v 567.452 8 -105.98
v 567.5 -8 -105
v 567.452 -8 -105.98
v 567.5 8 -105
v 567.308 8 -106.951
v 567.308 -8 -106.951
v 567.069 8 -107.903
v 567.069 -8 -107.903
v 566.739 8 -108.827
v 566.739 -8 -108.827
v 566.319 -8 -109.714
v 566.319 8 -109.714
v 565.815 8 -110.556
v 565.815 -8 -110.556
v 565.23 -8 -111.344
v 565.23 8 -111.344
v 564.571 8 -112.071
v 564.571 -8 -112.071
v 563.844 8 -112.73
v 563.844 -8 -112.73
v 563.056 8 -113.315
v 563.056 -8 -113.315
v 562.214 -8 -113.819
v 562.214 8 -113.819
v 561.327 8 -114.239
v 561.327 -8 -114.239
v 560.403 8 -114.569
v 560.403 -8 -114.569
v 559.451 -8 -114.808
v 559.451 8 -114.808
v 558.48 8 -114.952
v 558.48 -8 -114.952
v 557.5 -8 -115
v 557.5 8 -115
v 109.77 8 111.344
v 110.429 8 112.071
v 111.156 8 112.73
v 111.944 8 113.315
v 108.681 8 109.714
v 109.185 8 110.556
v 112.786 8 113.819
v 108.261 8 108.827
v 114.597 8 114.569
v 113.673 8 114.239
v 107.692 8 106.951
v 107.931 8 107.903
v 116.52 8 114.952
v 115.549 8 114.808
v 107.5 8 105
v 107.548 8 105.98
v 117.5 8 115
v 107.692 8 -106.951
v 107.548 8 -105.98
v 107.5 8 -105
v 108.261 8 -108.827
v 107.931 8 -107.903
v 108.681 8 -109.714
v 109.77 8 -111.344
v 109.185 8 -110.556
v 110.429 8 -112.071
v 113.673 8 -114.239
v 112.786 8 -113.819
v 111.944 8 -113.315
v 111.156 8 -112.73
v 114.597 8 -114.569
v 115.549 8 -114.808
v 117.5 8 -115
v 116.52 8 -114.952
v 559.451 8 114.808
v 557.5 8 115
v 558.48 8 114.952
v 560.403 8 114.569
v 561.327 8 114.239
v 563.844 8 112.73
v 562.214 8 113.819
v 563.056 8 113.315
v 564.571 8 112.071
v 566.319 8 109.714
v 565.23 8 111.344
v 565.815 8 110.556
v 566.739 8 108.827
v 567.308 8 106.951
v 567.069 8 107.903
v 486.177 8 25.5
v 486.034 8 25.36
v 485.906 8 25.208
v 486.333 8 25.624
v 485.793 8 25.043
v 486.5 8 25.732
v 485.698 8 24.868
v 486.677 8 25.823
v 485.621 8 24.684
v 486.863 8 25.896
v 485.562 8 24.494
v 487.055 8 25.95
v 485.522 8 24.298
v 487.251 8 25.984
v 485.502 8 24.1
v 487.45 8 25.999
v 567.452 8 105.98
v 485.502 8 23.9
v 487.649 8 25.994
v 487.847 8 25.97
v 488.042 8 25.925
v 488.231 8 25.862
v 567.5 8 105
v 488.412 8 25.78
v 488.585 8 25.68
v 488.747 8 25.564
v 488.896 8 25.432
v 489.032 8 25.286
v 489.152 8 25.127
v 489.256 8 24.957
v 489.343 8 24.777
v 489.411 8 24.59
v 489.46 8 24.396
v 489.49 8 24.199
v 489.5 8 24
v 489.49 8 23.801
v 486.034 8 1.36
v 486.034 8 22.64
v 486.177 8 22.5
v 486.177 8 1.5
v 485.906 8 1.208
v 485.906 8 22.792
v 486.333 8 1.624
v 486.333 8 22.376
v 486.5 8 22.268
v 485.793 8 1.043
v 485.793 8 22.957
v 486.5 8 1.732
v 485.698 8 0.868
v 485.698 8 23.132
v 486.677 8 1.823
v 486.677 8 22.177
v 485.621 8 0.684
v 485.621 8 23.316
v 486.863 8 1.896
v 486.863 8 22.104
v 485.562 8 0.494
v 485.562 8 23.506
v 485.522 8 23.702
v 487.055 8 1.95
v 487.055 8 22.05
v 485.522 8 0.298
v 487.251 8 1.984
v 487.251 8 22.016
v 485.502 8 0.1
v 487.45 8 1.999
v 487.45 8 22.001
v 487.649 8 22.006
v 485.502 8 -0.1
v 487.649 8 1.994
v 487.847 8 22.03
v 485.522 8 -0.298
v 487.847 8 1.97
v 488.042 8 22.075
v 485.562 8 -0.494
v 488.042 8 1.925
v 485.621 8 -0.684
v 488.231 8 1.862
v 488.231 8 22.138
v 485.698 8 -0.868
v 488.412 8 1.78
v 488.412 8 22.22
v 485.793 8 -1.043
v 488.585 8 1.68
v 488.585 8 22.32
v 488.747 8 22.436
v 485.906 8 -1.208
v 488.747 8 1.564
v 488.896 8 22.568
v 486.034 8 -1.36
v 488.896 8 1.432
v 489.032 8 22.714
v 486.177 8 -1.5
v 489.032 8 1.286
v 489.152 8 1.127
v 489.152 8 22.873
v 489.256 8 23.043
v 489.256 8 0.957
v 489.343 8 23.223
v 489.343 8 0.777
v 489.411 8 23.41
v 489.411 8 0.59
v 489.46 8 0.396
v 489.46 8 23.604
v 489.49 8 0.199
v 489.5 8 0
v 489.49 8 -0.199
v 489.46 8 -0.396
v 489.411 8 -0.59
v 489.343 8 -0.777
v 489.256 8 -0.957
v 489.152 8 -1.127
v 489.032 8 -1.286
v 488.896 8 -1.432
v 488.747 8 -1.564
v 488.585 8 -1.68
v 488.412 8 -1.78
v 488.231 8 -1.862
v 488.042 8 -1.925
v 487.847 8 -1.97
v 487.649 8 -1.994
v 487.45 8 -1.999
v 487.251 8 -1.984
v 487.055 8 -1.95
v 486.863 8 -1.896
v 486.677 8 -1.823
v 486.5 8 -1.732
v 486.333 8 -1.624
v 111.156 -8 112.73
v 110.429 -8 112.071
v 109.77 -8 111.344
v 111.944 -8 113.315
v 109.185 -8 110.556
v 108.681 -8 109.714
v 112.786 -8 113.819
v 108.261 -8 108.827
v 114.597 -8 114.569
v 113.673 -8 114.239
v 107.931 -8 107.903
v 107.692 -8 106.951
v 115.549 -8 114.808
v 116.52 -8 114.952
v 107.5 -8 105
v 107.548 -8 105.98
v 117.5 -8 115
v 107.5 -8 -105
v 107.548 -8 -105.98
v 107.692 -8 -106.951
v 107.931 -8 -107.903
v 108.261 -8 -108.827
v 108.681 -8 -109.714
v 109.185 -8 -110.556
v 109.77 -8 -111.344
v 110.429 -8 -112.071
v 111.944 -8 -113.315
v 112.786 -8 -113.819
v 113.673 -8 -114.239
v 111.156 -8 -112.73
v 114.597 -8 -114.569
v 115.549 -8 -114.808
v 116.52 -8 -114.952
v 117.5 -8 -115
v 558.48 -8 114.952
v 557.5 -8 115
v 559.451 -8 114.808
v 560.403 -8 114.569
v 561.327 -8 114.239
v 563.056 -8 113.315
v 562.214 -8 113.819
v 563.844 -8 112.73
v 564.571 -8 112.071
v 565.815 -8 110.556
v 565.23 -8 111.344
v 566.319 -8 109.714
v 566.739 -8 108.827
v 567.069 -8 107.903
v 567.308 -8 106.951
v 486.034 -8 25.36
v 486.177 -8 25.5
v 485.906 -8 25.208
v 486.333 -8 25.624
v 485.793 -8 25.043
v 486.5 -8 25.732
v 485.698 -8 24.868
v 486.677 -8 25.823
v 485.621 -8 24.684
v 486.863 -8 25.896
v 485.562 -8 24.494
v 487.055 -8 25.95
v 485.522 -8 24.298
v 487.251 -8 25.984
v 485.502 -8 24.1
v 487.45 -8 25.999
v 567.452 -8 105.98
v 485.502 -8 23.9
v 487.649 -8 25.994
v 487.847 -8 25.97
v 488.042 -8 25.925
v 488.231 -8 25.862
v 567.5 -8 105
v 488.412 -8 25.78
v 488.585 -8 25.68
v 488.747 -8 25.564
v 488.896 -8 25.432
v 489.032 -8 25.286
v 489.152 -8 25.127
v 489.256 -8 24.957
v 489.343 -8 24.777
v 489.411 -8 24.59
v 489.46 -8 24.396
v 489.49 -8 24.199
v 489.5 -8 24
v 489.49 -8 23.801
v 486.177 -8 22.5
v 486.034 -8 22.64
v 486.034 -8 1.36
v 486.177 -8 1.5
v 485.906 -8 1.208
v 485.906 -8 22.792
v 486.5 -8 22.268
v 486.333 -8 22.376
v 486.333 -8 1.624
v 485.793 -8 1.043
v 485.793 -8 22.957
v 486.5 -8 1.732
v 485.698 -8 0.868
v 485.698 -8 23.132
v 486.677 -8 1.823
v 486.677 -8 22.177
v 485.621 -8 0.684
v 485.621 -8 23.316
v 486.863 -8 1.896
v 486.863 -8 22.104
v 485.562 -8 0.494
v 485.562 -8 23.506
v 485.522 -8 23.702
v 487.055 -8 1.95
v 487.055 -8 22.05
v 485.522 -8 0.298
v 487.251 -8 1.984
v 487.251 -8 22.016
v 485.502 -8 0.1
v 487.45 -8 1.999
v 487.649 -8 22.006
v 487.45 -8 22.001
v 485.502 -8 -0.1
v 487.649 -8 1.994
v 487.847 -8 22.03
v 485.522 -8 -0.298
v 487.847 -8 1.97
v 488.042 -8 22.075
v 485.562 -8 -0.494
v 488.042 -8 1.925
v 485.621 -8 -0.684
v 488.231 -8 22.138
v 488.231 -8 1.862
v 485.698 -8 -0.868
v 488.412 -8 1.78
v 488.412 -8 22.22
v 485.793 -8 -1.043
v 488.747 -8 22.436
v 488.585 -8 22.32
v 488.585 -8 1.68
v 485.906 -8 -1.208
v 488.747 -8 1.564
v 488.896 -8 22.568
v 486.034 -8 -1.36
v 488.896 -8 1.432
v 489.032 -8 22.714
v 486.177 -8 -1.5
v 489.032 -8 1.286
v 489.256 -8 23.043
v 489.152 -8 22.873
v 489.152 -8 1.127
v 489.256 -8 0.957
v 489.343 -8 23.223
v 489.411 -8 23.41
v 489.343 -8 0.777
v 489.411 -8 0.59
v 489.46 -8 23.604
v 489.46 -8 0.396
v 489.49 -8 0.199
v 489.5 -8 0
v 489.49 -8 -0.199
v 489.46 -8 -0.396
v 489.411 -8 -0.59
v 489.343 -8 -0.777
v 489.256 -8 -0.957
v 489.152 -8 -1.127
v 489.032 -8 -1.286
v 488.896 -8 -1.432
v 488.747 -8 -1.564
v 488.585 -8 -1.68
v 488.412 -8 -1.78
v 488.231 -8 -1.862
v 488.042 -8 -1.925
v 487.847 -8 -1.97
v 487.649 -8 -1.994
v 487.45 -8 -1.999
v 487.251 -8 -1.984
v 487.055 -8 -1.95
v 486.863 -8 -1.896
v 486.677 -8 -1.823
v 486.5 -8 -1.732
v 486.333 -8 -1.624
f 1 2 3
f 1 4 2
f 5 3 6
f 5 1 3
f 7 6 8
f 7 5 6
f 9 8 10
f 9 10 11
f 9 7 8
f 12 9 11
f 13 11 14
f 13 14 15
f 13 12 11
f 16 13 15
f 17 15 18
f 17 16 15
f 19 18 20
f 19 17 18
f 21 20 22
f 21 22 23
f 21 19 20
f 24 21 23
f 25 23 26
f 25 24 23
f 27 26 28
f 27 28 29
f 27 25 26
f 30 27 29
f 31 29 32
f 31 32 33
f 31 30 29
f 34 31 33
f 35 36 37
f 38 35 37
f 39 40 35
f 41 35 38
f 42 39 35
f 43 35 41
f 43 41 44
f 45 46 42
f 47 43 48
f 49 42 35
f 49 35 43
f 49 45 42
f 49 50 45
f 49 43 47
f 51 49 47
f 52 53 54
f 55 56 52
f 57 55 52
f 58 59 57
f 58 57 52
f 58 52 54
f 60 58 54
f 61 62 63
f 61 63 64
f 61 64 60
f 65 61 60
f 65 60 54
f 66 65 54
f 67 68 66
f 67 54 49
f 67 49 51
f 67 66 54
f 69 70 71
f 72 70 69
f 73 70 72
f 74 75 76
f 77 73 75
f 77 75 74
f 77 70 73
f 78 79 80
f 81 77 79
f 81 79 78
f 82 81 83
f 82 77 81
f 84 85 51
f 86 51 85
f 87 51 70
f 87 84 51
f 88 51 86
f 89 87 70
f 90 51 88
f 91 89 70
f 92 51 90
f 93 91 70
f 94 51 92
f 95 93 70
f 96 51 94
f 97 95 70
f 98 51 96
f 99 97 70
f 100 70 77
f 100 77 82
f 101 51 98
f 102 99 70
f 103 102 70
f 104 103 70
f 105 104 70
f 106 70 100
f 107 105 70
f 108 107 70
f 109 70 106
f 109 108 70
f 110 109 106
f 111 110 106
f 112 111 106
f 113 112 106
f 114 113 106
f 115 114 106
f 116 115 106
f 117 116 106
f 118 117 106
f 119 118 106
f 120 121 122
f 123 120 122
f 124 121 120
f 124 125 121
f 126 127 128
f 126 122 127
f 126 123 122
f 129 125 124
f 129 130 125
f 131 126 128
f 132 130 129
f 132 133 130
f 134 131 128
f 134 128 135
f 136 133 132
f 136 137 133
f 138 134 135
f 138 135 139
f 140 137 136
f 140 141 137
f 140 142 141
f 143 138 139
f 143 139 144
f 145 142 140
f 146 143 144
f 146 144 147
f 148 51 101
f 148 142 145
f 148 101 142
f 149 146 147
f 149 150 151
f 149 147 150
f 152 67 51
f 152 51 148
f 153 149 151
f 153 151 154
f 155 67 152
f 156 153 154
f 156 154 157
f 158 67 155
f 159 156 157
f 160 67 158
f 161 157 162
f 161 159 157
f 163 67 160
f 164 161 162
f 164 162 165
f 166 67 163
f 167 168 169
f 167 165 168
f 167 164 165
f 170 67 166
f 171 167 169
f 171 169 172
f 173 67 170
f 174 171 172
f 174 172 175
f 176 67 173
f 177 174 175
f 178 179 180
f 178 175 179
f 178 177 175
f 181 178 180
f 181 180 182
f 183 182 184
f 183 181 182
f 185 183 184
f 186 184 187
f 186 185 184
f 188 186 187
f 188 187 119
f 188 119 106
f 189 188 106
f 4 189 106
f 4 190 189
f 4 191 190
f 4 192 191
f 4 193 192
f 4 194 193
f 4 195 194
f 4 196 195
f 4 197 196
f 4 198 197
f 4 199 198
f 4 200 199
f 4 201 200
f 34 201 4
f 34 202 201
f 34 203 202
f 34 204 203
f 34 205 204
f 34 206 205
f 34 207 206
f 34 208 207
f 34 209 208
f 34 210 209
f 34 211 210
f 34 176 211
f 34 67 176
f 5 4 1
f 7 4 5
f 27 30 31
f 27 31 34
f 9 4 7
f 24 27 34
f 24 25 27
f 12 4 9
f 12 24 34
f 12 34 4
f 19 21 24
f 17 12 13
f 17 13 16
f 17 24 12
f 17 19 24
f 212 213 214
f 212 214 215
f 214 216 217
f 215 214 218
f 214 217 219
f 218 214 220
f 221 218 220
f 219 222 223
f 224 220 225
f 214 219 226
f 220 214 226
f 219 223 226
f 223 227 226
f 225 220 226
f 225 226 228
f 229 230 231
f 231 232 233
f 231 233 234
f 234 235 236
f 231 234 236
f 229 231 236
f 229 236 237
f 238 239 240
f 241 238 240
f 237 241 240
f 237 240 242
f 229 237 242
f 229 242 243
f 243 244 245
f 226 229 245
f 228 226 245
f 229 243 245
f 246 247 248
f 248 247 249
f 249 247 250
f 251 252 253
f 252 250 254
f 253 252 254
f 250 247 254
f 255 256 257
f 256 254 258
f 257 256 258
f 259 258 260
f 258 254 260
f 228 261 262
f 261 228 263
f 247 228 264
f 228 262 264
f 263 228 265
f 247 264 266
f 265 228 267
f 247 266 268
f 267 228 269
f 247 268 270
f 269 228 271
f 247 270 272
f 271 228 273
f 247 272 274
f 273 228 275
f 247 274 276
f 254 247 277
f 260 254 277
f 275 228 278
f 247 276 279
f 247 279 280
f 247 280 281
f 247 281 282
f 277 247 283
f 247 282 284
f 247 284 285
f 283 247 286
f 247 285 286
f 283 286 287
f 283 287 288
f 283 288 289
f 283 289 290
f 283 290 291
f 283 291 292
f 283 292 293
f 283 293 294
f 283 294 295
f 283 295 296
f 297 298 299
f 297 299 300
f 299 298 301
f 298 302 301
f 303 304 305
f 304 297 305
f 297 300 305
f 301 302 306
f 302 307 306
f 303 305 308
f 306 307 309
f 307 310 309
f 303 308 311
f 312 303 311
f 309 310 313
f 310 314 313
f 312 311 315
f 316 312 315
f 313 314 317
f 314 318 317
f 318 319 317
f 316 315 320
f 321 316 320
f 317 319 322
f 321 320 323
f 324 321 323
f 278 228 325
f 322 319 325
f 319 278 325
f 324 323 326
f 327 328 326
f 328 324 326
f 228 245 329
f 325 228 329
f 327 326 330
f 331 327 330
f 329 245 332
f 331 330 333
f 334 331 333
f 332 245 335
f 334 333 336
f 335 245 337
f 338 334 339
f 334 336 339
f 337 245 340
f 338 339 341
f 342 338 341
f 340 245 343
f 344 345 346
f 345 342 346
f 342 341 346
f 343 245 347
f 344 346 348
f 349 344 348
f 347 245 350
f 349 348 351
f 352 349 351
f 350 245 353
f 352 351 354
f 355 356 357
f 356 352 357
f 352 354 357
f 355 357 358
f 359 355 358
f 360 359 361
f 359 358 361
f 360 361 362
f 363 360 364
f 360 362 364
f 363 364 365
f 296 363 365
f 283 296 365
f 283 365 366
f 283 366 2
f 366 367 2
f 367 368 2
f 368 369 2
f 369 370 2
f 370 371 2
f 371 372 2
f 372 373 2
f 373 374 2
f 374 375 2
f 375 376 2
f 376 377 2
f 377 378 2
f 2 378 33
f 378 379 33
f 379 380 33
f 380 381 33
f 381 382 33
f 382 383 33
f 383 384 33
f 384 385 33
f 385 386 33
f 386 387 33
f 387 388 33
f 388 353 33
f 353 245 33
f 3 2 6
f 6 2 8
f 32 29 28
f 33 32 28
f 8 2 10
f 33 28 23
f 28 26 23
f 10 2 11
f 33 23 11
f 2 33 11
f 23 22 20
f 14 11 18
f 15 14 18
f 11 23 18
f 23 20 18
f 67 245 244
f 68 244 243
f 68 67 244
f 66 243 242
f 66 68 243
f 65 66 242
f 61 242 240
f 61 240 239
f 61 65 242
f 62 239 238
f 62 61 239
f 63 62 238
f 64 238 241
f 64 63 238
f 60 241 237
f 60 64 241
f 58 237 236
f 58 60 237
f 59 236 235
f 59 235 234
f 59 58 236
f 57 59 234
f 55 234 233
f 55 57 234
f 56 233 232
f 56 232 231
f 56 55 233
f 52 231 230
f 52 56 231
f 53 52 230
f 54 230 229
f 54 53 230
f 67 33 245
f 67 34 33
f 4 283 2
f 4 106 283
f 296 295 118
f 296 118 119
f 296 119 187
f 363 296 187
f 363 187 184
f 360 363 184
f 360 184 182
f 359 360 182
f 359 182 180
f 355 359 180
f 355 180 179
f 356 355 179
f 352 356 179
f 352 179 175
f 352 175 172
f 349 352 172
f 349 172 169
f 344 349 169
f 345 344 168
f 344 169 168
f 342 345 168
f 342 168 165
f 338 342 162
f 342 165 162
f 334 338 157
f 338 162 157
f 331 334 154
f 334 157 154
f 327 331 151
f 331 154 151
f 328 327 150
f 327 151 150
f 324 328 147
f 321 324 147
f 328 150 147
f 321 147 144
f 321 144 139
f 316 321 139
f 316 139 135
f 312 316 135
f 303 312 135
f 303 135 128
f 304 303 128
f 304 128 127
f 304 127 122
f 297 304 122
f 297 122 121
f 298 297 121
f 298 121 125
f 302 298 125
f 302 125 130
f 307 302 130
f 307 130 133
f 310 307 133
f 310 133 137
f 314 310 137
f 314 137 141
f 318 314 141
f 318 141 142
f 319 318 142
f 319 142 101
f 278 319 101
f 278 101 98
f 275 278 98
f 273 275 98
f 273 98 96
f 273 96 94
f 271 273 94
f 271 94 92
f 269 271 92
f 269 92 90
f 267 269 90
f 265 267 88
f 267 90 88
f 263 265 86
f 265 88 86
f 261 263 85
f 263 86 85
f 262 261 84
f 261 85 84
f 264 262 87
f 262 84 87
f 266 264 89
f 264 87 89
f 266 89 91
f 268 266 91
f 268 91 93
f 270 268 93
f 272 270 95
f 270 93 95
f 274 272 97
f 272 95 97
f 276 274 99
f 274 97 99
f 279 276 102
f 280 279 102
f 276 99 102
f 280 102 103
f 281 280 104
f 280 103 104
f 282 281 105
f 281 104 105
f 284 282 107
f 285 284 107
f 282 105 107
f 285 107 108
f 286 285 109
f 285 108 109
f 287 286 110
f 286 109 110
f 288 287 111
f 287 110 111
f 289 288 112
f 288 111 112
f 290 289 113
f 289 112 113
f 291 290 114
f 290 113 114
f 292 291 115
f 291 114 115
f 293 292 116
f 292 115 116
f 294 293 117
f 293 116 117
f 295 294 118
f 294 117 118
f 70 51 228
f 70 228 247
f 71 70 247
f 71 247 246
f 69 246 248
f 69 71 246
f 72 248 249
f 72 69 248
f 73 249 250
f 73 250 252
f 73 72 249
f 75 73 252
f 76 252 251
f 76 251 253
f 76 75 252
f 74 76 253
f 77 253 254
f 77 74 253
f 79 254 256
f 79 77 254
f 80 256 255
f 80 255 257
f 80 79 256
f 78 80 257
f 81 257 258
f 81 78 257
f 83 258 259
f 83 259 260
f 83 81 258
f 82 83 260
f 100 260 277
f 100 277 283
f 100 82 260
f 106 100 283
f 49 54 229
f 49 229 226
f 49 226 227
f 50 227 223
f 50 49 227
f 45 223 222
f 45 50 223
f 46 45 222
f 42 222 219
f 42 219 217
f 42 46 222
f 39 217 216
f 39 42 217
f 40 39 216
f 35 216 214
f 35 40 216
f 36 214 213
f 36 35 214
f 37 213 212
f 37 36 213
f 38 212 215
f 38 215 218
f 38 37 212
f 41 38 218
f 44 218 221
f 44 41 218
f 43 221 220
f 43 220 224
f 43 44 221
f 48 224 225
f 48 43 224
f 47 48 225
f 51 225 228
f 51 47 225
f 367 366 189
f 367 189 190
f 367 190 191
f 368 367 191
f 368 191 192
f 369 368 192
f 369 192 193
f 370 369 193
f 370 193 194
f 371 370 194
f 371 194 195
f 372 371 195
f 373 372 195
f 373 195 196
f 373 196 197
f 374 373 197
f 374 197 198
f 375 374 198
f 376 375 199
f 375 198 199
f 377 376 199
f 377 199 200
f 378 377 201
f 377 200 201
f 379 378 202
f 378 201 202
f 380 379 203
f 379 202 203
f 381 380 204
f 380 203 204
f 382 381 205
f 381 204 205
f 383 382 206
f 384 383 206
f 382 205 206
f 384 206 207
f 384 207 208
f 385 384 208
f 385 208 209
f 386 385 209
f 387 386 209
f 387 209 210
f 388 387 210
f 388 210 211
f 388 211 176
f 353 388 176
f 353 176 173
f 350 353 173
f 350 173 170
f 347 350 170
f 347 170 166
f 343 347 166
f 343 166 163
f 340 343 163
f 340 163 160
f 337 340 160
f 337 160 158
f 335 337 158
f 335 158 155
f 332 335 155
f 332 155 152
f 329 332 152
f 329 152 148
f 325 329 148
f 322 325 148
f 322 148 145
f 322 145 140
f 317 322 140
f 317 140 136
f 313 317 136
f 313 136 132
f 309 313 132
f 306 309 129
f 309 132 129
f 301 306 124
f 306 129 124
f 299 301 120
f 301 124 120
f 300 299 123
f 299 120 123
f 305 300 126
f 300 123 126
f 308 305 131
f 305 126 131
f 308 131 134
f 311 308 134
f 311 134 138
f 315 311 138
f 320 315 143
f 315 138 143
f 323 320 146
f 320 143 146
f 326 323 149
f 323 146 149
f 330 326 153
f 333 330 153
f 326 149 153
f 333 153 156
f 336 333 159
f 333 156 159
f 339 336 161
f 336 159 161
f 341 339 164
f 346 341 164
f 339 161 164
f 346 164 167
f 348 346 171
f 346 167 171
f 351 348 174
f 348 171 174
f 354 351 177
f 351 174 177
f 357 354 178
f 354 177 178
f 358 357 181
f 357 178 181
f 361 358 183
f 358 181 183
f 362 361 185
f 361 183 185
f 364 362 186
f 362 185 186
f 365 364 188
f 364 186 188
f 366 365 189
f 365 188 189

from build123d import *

# Parameters (mm, degrees)
EXTRUDE_1_DEPTH     = 8
CUT_EXTRUDE_9_REACH = 581.256
SKETCH_15_R         = 2


with BuildPart() as part:
    # 草圖1 → 填料-伸長1 (new, symmetric)
    with BuildSketch(Plane(origin=(0, 0, 0), x_dir=(1, 0, 0), z_dir=(0, 1, 0))):
        with BuildLine():
            ThreePointArc((567.5, 105), (564.571067812, 112.071067812), (557.5, 115))
            Line((557.5, 115), (117.5, 115))
            ThreePointArc((117.5, 115), (110.428932188, 112.071067812), (107.5, 105))
            Line((107.5, 105), (107.5, -105))
            ThreePointArc((107.5, -105), (110.428932188, -112.071067812), (117.5, -115))
            Line((117.5, -115), (557.5, -115))
            ThreePointArc((557.5, -115), (564.571067812, -112.071067812), (567.5, -105))
            Line((567.5, -105), (567.5, 105))
        make_face()
    extrude(amount=EXTRUDE_1_DEPTH, both=True)

    # 草圖15 → 除料-伸長9 (cut, up to next)
    with BuildSketch(Plane(origin=(0, 8, 0), x_dir=(1, 0, 0), z_dir=(0, 1, 0)), mode=Mode.PRIVATE) as cut_extrude_9_sk1:
        with Locations((487.5, -24)):
            Circle(SKETCH_15_R)
    cut_extrude_9_tool1 = extrude(cut_extrude_9_sk1.sketch, amount=-CUT_EXTRUDE_9_REACH, mode=Mode.PRIVATE) & part.part
    # 草圖15 → 除料-伸長9 (cut, up to next)
    with BuildSketch(Plane(origin=(0, 8, 0), x_dir=(1, 0, 0), z_dir=(0, 1, 0)), mode=Mode.PRIVATE) as cut_extrude_9_sk2:
        with Locations((487.5, 0)):
            Circle(SKETCH_15_R)
    cut_extrude_9_tool2 = extrude(cut_extrude_9_sk2.sketch, amount=-CUT_EXTRUDE_9_REACH, mode=Mode.PRIVATE) & part.part
    add(cut_extrude_9_tool1.solids().sort_by_distance((487.5, 8, 24))[0], mode=Mode.SUBTRACT)
    add(cut_extrude_9_tool2.solids().sort_by_distance((487.5, 8, 0))[0], mode=Mode.SUBTRACT)


solid = part.part
